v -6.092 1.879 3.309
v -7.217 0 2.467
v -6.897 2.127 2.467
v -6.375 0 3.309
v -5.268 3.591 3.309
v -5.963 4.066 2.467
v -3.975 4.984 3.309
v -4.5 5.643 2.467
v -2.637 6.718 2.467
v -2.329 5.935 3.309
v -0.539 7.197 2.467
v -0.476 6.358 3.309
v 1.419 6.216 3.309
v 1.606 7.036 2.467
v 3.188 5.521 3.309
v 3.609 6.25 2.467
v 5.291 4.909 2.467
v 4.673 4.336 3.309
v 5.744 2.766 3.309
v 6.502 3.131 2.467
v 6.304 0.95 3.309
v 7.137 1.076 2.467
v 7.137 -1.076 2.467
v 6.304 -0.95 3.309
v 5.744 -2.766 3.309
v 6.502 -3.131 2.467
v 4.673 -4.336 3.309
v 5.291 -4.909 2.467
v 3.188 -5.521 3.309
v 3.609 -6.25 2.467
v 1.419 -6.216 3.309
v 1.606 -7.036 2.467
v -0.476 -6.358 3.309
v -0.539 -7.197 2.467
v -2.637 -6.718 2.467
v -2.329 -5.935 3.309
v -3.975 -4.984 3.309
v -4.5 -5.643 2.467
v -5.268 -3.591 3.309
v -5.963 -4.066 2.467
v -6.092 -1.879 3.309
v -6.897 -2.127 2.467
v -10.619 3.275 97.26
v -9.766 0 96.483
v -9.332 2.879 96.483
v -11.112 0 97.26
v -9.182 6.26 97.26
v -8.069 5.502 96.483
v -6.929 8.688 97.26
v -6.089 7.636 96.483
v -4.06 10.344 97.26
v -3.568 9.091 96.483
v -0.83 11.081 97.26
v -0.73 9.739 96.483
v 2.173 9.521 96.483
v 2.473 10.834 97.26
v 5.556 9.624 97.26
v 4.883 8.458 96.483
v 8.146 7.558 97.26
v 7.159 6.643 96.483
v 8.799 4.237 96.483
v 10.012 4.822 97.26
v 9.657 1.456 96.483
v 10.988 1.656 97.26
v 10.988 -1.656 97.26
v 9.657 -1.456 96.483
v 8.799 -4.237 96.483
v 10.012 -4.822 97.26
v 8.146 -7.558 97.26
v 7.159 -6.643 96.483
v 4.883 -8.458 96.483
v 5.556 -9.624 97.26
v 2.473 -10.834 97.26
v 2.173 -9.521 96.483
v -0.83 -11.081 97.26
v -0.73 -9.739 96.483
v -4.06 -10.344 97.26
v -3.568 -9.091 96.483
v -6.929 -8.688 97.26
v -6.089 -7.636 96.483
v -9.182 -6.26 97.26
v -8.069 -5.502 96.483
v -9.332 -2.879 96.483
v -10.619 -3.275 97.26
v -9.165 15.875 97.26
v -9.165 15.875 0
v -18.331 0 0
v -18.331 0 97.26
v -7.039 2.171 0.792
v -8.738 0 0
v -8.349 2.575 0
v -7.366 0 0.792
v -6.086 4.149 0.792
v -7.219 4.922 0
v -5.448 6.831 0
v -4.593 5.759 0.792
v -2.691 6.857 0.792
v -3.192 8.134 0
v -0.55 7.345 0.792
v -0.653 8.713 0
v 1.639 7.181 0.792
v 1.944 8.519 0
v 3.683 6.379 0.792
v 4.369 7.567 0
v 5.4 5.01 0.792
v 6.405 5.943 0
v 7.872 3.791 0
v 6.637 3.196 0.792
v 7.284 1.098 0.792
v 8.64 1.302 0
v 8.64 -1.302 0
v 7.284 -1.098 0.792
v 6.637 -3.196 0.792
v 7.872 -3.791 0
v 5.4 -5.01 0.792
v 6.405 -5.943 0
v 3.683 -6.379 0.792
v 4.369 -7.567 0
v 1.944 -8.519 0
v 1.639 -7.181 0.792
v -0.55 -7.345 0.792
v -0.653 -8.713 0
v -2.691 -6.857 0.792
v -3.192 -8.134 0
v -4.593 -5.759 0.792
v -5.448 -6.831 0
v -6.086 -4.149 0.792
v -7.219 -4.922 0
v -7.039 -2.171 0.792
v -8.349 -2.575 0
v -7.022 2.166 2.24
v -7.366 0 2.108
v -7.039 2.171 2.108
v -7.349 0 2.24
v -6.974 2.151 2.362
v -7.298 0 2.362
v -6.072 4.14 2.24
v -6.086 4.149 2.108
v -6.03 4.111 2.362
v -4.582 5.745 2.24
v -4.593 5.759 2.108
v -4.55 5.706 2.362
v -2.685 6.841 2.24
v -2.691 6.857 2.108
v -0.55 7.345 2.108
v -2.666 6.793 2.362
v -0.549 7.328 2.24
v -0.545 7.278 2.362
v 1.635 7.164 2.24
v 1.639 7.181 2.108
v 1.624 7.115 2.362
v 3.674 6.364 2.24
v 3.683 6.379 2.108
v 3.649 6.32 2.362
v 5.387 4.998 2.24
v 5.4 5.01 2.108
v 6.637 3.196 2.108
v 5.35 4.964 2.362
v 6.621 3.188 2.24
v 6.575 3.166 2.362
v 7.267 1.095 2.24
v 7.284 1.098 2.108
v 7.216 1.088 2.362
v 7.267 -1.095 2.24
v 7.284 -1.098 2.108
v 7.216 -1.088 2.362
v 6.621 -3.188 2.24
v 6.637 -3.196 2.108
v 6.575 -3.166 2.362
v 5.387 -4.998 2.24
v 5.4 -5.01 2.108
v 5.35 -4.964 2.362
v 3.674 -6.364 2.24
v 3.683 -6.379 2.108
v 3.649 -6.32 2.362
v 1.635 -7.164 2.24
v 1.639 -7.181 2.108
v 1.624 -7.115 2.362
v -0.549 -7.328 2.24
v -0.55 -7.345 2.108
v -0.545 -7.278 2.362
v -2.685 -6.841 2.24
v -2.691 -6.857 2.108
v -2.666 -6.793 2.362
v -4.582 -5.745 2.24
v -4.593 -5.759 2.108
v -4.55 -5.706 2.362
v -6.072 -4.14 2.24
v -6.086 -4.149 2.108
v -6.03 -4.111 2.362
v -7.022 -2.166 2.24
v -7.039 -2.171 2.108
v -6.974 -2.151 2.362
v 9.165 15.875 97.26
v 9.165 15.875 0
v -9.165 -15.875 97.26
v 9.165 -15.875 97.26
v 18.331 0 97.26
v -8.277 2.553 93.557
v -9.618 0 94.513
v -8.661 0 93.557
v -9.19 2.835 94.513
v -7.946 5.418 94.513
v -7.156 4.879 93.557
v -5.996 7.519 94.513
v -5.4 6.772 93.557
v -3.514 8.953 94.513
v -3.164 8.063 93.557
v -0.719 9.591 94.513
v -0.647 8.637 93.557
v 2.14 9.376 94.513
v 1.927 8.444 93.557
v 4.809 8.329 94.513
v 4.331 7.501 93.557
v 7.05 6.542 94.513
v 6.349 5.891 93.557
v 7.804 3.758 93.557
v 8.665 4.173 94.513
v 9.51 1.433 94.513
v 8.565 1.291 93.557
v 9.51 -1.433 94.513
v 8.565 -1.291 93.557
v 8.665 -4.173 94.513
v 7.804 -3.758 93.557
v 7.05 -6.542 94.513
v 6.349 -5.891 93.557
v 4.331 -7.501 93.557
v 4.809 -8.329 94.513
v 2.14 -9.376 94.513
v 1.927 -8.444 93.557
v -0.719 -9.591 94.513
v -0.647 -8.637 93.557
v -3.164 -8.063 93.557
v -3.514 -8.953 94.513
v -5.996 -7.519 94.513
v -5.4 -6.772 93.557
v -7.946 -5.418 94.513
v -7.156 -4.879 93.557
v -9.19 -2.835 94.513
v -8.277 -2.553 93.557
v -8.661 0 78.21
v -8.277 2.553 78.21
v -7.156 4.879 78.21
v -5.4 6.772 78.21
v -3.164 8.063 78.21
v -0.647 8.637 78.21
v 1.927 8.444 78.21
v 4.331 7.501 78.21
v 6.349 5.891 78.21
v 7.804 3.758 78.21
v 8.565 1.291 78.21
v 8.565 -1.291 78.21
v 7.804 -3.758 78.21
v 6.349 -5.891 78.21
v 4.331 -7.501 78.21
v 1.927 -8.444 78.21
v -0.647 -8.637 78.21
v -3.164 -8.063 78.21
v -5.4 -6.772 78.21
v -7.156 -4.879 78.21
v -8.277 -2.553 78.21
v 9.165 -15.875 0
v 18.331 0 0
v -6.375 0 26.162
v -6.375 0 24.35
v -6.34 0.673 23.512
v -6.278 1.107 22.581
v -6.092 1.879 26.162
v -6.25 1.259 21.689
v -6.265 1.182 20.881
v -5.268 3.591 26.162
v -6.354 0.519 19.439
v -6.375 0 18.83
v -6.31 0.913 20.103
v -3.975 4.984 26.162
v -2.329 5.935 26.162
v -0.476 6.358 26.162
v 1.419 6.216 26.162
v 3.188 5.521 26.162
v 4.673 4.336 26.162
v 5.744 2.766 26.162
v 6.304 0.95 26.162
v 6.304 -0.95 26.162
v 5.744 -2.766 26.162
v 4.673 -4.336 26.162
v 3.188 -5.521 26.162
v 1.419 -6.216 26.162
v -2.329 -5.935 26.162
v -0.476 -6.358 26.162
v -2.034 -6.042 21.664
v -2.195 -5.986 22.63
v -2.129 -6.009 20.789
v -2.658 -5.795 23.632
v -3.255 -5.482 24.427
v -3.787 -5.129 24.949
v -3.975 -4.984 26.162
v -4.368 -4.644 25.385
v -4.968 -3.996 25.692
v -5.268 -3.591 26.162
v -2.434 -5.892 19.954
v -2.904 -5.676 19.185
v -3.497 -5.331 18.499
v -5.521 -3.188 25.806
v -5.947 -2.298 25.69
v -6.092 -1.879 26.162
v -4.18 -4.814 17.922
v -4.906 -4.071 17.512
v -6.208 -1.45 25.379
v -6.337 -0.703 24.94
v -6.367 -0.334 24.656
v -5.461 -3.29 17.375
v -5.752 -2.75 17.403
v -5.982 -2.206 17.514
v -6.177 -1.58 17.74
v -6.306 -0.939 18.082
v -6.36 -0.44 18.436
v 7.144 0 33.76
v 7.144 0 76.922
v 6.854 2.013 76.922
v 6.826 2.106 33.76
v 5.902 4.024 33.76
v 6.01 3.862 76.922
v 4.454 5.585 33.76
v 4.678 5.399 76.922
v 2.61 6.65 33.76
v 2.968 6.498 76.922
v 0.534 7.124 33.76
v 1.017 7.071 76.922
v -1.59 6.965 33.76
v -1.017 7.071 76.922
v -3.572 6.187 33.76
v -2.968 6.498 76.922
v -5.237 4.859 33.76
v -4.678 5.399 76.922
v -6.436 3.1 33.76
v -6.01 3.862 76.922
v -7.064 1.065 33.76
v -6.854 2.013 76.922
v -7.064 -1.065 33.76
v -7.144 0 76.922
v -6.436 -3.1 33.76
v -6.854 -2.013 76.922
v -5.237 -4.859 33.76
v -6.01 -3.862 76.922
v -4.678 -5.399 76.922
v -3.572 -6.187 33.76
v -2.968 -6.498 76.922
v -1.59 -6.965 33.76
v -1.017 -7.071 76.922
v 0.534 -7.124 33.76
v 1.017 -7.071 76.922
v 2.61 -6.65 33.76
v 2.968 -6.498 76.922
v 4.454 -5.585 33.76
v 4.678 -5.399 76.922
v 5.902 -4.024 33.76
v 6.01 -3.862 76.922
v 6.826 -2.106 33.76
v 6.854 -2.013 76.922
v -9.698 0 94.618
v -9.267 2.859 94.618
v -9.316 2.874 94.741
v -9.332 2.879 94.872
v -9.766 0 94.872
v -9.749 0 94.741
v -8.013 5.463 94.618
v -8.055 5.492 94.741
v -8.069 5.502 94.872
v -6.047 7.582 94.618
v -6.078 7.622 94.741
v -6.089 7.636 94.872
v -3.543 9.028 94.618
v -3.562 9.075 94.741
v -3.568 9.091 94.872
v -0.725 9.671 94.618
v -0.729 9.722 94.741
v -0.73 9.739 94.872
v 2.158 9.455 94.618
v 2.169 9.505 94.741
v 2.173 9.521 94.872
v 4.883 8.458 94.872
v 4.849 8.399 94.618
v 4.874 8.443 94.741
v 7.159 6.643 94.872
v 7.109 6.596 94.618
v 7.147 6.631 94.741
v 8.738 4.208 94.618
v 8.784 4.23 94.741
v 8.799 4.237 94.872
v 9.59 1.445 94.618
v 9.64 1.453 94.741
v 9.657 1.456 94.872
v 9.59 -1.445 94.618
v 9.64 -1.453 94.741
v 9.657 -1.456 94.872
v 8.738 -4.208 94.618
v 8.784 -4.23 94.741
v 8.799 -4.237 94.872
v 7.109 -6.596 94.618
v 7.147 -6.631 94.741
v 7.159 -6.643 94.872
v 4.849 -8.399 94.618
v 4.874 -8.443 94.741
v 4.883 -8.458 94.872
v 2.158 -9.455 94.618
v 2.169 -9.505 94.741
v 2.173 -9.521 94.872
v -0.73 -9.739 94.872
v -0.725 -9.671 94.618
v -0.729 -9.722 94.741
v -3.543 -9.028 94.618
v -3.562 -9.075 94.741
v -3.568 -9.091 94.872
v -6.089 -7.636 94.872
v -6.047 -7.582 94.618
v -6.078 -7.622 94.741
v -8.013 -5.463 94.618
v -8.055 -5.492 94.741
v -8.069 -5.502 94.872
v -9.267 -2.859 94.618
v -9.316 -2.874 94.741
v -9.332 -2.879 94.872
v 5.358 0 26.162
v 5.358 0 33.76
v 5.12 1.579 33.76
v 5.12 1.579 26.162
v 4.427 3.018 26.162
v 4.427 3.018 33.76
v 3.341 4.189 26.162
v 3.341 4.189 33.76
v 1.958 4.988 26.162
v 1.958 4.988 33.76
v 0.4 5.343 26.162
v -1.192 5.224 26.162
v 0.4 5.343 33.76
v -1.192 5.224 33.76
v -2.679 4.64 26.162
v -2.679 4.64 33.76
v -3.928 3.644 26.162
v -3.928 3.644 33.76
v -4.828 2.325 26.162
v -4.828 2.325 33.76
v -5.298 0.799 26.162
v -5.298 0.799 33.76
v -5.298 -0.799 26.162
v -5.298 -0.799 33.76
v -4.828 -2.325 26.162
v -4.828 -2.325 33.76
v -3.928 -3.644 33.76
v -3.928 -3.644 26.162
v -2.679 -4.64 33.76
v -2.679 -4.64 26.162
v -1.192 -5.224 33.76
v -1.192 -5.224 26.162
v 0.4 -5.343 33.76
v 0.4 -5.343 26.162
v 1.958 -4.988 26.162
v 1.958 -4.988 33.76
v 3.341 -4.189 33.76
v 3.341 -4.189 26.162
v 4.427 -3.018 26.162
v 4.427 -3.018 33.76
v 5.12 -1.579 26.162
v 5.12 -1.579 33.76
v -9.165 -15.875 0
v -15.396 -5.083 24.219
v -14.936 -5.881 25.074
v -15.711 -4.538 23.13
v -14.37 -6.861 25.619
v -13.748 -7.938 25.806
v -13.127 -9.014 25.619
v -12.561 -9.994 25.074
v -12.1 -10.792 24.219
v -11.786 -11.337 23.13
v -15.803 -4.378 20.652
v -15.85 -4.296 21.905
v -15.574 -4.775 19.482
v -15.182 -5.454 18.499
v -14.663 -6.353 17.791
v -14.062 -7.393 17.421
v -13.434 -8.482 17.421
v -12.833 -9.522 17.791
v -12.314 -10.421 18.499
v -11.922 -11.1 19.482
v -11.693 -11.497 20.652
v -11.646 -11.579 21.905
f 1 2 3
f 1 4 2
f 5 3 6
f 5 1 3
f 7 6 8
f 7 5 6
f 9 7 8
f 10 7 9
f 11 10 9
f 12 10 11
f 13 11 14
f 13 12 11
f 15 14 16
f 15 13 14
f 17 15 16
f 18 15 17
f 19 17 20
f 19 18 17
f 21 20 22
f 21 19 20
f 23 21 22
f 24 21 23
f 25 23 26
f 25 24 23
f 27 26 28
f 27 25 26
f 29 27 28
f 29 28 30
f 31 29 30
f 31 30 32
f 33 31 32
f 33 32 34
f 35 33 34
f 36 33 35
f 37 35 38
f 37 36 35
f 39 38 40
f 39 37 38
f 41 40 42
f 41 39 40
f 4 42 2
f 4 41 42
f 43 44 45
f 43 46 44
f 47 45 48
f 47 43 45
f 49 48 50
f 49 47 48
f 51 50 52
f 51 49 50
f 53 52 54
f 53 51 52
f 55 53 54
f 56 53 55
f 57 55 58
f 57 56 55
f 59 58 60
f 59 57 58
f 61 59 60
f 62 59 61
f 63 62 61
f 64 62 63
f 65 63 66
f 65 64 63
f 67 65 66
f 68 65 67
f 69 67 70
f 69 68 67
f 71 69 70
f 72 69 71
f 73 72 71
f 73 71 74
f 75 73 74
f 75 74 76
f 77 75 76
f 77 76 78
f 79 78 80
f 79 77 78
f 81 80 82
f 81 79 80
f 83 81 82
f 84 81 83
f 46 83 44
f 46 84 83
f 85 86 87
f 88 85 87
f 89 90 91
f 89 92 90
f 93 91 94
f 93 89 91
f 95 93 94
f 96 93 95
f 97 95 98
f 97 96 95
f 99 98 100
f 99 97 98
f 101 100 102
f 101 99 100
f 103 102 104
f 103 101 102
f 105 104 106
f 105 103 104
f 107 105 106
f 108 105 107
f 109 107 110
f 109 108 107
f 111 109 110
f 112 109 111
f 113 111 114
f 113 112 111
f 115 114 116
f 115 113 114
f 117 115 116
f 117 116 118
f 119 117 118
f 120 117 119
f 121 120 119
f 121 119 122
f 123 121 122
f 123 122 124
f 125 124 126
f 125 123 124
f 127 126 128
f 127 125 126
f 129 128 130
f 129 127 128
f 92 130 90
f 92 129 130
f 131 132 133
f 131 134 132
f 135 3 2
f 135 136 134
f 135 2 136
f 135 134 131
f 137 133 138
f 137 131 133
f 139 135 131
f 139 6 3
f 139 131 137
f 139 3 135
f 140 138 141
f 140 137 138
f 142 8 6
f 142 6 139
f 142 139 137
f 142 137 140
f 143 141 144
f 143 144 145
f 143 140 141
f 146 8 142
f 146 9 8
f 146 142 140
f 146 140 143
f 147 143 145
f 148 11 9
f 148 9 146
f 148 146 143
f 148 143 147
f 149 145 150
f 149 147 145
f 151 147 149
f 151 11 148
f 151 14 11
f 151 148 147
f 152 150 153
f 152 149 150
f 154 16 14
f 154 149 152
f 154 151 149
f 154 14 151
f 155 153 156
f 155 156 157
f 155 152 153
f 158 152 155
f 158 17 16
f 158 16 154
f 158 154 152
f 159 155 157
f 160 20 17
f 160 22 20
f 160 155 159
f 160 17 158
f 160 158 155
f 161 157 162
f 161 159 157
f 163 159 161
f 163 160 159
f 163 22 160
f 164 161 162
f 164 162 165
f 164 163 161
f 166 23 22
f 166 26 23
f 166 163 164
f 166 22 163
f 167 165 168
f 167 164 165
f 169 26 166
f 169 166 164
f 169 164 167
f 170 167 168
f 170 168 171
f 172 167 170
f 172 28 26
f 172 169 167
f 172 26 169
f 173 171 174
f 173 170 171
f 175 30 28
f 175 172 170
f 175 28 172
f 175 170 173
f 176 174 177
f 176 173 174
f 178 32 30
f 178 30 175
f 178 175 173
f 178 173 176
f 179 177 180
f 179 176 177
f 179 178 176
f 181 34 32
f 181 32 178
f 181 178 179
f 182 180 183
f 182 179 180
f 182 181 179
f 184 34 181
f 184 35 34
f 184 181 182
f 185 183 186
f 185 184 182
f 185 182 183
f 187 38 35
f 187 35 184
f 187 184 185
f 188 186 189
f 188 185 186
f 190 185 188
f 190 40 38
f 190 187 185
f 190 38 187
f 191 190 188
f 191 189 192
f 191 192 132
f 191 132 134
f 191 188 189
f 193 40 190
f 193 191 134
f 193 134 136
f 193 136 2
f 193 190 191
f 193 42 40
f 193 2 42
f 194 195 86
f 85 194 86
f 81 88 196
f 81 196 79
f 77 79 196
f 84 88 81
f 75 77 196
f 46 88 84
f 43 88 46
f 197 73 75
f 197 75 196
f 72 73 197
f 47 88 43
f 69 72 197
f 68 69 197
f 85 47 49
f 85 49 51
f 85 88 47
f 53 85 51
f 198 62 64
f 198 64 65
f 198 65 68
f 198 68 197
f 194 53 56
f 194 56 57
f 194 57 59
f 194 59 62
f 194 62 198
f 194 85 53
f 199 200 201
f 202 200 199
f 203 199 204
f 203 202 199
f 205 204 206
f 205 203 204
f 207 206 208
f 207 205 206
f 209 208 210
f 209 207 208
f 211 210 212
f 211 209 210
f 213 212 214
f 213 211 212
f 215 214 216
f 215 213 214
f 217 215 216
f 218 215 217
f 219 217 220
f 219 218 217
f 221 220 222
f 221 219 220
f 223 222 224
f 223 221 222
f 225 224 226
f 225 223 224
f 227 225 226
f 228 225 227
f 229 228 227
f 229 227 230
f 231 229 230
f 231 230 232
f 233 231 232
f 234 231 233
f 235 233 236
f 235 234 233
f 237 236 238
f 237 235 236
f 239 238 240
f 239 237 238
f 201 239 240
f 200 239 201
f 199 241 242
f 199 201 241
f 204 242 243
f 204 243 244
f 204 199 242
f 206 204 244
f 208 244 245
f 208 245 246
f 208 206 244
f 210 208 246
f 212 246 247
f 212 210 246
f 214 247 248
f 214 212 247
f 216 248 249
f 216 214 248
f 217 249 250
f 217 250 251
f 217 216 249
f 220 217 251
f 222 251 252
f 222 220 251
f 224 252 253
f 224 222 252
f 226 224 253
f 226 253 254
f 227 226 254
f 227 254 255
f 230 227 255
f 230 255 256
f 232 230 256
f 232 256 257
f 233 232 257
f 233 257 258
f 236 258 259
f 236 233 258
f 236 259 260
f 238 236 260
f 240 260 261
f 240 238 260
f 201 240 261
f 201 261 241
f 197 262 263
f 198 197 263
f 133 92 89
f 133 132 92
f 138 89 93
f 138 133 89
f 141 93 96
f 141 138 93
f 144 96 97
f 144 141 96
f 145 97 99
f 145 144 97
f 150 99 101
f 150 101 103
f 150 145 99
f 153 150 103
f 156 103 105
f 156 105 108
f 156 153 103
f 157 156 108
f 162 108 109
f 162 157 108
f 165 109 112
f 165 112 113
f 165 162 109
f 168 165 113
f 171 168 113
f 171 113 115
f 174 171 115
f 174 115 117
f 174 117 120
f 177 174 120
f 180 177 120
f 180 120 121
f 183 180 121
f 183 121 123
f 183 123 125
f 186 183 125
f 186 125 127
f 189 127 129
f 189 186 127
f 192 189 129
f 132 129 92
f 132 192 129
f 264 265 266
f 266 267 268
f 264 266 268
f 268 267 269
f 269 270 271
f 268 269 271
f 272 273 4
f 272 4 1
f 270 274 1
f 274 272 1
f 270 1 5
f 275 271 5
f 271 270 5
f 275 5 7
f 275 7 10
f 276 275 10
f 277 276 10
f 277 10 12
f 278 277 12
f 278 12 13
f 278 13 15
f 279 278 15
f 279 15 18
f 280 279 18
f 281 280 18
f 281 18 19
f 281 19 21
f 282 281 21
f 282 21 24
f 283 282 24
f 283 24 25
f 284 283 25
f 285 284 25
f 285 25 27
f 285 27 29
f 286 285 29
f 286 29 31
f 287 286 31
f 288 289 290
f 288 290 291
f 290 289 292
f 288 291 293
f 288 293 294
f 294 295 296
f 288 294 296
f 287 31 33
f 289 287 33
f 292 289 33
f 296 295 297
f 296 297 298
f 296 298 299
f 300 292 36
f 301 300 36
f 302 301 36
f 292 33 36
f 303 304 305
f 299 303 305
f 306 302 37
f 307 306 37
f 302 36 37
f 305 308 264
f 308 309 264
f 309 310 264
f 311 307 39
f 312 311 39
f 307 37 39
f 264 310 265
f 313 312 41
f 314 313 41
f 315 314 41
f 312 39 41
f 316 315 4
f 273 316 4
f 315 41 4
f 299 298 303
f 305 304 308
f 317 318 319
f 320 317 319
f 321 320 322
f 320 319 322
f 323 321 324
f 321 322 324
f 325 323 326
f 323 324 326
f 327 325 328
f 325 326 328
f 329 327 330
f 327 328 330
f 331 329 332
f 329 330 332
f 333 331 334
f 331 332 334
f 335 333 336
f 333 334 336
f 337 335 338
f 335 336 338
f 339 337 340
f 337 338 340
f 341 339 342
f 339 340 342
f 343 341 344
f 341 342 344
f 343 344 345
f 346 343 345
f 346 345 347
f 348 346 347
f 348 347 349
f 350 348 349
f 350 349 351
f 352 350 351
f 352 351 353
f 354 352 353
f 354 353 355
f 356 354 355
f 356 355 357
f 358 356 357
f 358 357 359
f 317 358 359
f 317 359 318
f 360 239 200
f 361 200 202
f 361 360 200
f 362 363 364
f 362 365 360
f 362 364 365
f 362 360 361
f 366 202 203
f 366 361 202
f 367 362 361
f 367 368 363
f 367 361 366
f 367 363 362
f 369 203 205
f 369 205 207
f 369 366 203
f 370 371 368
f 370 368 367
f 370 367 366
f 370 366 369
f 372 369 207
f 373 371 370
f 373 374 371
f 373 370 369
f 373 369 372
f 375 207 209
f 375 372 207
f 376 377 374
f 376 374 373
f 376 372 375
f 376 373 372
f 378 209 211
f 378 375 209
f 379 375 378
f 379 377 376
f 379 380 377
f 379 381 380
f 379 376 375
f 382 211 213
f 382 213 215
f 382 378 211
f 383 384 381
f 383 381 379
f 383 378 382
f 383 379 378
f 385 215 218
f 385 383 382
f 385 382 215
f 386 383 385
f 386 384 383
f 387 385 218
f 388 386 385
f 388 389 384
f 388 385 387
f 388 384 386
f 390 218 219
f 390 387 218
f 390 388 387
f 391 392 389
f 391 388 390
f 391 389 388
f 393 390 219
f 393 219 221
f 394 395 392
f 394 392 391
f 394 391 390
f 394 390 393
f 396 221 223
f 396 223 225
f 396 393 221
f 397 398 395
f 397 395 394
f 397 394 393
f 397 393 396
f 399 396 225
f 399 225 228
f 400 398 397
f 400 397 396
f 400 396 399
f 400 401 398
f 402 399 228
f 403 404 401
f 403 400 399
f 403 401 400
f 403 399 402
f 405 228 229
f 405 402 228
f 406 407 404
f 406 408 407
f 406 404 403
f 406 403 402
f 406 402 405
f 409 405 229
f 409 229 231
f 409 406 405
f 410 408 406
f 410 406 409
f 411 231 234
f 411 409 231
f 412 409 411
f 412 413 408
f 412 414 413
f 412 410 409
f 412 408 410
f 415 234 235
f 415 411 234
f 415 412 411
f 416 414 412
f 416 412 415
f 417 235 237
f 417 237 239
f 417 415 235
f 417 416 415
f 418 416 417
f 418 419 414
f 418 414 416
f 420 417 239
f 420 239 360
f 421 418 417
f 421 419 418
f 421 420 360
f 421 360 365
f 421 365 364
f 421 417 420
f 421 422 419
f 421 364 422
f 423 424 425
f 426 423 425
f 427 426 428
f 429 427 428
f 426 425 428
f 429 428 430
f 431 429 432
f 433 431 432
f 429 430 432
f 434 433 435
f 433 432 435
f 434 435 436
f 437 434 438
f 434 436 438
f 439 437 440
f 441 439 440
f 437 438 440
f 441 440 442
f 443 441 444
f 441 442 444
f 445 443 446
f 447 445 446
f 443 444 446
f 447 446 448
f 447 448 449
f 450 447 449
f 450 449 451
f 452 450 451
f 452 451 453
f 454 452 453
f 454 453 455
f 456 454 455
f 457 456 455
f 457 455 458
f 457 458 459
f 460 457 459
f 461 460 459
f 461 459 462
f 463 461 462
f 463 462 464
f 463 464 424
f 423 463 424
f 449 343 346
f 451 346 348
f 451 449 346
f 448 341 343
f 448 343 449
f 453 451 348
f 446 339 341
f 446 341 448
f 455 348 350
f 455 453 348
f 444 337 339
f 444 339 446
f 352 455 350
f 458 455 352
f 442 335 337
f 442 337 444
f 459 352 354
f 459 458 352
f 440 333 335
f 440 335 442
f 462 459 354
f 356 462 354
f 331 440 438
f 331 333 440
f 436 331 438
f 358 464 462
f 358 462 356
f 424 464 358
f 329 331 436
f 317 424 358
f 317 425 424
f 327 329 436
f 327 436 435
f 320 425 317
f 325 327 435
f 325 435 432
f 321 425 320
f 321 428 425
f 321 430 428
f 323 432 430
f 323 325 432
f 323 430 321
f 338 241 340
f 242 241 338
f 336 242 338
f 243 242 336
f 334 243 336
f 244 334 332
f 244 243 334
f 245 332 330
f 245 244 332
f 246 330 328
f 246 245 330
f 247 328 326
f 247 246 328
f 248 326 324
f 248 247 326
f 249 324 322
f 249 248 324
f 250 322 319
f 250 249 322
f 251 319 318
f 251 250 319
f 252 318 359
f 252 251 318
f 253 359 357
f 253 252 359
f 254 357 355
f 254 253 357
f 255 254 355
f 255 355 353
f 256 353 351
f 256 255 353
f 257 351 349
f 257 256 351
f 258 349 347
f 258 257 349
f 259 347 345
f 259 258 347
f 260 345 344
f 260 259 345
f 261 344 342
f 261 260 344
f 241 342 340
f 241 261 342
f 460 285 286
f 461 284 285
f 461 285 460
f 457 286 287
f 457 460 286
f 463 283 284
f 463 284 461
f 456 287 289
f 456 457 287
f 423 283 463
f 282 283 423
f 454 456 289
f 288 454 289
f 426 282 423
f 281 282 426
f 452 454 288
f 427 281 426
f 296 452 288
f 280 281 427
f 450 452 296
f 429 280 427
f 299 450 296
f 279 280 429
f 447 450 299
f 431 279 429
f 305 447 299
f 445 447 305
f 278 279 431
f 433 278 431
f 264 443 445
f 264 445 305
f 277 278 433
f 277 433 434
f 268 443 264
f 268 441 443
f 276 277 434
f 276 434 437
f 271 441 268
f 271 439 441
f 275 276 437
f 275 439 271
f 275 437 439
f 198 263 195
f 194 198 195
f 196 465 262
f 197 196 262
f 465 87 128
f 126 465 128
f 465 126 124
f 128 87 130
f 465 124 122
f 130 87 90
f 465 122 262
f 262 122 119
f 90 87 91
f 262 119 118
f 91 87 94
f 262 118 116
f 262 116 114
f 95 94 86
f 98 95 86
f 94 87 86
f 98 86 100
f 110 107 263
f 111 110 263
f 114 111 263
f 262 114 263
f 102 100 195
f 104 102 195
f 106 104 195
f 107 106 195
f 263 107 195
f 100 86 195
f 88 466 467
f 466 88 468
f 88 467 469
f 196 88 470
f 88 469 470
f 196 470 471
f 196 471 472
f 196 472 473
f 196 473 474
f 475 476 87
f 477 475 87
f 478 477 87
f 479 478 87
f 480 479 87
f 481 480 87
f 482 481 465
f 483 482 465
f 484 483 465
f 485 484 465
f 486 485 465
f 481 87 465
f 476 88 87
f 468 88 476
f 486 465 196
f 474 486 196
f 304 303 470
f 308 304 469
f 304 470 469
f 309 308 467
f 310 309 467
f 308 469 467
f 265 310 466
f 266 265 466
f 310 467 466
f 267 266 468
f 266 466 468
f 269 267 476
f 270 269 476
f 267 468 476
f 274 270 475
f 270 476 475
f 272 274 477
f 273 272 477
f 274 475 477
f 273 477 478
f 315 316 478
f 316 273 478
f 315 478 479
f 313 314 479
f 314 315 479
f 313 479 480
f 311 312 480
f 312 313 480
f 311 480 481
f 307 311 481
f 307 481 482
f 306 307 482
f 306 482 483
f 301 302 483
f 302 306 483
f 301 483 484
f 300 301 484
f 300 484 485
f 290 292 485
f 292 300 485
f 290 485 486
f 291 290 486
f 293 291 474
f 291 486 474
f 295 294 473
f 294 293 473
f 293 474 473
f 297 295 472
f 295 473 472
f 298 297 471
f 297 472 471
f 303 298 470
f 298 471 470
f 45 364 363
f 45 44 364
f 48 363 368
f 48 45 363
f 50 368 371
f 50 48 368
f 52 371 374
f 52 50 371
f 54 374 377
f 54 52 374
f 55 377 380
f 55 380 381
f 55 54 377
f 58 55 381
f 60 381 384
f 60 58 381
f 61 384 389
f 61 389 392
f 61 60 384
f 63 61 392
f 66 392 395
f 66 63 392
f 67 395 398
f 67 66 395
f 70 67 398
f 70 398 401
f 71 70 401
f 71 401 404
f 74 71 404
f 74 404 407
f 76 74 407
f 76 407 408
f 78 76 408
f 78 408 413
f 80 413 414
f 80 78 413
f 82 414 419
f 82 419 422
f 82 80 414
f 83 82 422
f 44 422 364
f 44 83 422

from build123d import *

# Parameters (mm, degrees)
EXTRUDE1_DEPTH     = 97.259775
SKETCH3_R          = 5.35813
CUT_EXTRUDE3_DEPTH = 98.259775
CUT_EXTRUDE2_REACH = 41.688
SKETCH4_R          = 4.2164
SKETCH5_R          = 6.3754
CUT_EXTRUDE4_DEPTH = 26.162
SKETCH6_R          = 7.14375
CUT_EXTRUDE5_DEPTH = 63.5


with BuildPart() as part:
    # Sketch1 → Extrude1 (new body)
    with BuildSketch(Plane.XY):
        Polygon((-18.330871047, 0), (-9.165435523, -15.875), (9.165435523, -15.875), (18.330871047, 0), (9.165435523, 15.875), (-9.165435523, 15.875), align=None)
    extrude(amount=EXTRUDE1_DEPTH)

    # Sketch3 → Cut-Extrude3 (cut, through all)
    with BuildSketch(Plane.XY.offset(97.259775)):
        Circle(SKETCH3_R)
    extrude(amount=-CUT_EXTRUDE3_DEPTH, mode=Mode.SUBTRACT)

    # Sketch4 → Cut-Extrude2 (cut, up to next)
    with BuildSketch(Plane(origin=(-13.748153285, -7.9375, 0), x_dir=(0, 0, 1), z_dir=(-0.866025404, -0.5, 0)), mode=Mode.PRIVATE) as cut_extrude2_sk1:
        with Locations((21.59, 0)):
            Circle(SKETCH4_R)
    cut_extrude2_tool1 = extrude(cut_extrude2_sk1.sketch, amount=-CUT_EXTRUDE2_REACH, mode=Mode.PRIVATE) & part.part
    add(cut_extrude2_tool1.solids().sort_by_distance((-13.748153, -7.9375, 21.59))[0], mode=Mode.SUBTRACT)

    # Sketch5 → Cut-Extrude4 (cut)
    with BuildSketch(Plane(origin=(0, 0, 0), x_dir=(-1, 0, 0), z_dir=(0, 0, -1))):
        Circle(SKETCH5_R)
    extrude(amount=-CUT_EXTRUDE4_DEPTH, mode=Mode.SUBTRACT)

    # Sketch6 → Cut-Extrude5 (cut)
    with BuildSketch(Plane.XY.offset(97.259775)):
        Circle(SKETCH6_R)
    extrude(amount=-CUT_EXTRUDE5_DEPTH, mode=Mode.SUBTRACT)

    # Sketch8 → Cut-Revolve1 (revolve, cut)
    with BuildSketch(Plane(origin=(0, 0, 0), x_dir=(1, 0, 0), z_dir=(0, 1, 0))):
        with BuildLine():
            Line((0, -97.259775), (0, -76.076175))
            Line((0, -76.076175), (-6.1468, -76.076175))
            Line((-6.1468, -76.076175), (-8.6614, -78.209775))
            Line((-8.6614, -78.209775), (-8.6614, -93.55685451))
            Line((-8.6614, -93.55685451), (-9.617510245, -94.512964755))
            ThreePointArc((-9.617510245, -94.512964755), (-9.727630803, -94.677771816), (-9.7663, -94.872175))
            Line((-9.7663, -94.872175), (-9.7663, -96.482546068))
            Line((-9.7663, -96.482546068), (-11.1125, -97.259775))
            Line((-11.1125, -97.259775), (0, -97.259775))
        make_face()
    revolve(axis=Axis((0, 0, 97.259775), (0, 0, -1)), mode=Mode.SUBTRACT)

    # Sketch10 → Cut-Revolve2 (revolve, cut)
    with BuildSketch(Plane(origin=(0, 0, 0), x_dir=(1, 0, 0), z_dir=(0, 1, 0))):
        with BuildLine():
            Line((0, 0), (-8.7376, 0))
            Line((-8.7376, 0), (-7.366, -0.791893629))
            Line((-7.366, -0.791893629), (-7.366, -2.1082))
            ThreePointArc((-7.366, -2.1082), (-7.327330803, -2.302603184), (-7.217210245, -2.467410245))
            Line((-7.217210245, -2.467410245), (-6.3754, -3.30922049))
            Line((-6.3754, -3.30922049), (-6.3754, -17.907))
            Line((-6.3754, -17.907), (0, -17.907))
            Line((0, -17.907), (0, 0))
        make_face()
    revolve(axis=Axis((0, 0, 0), (0, 0, -1)), mode=Mode.SUBTRACT)


solid = part.part
